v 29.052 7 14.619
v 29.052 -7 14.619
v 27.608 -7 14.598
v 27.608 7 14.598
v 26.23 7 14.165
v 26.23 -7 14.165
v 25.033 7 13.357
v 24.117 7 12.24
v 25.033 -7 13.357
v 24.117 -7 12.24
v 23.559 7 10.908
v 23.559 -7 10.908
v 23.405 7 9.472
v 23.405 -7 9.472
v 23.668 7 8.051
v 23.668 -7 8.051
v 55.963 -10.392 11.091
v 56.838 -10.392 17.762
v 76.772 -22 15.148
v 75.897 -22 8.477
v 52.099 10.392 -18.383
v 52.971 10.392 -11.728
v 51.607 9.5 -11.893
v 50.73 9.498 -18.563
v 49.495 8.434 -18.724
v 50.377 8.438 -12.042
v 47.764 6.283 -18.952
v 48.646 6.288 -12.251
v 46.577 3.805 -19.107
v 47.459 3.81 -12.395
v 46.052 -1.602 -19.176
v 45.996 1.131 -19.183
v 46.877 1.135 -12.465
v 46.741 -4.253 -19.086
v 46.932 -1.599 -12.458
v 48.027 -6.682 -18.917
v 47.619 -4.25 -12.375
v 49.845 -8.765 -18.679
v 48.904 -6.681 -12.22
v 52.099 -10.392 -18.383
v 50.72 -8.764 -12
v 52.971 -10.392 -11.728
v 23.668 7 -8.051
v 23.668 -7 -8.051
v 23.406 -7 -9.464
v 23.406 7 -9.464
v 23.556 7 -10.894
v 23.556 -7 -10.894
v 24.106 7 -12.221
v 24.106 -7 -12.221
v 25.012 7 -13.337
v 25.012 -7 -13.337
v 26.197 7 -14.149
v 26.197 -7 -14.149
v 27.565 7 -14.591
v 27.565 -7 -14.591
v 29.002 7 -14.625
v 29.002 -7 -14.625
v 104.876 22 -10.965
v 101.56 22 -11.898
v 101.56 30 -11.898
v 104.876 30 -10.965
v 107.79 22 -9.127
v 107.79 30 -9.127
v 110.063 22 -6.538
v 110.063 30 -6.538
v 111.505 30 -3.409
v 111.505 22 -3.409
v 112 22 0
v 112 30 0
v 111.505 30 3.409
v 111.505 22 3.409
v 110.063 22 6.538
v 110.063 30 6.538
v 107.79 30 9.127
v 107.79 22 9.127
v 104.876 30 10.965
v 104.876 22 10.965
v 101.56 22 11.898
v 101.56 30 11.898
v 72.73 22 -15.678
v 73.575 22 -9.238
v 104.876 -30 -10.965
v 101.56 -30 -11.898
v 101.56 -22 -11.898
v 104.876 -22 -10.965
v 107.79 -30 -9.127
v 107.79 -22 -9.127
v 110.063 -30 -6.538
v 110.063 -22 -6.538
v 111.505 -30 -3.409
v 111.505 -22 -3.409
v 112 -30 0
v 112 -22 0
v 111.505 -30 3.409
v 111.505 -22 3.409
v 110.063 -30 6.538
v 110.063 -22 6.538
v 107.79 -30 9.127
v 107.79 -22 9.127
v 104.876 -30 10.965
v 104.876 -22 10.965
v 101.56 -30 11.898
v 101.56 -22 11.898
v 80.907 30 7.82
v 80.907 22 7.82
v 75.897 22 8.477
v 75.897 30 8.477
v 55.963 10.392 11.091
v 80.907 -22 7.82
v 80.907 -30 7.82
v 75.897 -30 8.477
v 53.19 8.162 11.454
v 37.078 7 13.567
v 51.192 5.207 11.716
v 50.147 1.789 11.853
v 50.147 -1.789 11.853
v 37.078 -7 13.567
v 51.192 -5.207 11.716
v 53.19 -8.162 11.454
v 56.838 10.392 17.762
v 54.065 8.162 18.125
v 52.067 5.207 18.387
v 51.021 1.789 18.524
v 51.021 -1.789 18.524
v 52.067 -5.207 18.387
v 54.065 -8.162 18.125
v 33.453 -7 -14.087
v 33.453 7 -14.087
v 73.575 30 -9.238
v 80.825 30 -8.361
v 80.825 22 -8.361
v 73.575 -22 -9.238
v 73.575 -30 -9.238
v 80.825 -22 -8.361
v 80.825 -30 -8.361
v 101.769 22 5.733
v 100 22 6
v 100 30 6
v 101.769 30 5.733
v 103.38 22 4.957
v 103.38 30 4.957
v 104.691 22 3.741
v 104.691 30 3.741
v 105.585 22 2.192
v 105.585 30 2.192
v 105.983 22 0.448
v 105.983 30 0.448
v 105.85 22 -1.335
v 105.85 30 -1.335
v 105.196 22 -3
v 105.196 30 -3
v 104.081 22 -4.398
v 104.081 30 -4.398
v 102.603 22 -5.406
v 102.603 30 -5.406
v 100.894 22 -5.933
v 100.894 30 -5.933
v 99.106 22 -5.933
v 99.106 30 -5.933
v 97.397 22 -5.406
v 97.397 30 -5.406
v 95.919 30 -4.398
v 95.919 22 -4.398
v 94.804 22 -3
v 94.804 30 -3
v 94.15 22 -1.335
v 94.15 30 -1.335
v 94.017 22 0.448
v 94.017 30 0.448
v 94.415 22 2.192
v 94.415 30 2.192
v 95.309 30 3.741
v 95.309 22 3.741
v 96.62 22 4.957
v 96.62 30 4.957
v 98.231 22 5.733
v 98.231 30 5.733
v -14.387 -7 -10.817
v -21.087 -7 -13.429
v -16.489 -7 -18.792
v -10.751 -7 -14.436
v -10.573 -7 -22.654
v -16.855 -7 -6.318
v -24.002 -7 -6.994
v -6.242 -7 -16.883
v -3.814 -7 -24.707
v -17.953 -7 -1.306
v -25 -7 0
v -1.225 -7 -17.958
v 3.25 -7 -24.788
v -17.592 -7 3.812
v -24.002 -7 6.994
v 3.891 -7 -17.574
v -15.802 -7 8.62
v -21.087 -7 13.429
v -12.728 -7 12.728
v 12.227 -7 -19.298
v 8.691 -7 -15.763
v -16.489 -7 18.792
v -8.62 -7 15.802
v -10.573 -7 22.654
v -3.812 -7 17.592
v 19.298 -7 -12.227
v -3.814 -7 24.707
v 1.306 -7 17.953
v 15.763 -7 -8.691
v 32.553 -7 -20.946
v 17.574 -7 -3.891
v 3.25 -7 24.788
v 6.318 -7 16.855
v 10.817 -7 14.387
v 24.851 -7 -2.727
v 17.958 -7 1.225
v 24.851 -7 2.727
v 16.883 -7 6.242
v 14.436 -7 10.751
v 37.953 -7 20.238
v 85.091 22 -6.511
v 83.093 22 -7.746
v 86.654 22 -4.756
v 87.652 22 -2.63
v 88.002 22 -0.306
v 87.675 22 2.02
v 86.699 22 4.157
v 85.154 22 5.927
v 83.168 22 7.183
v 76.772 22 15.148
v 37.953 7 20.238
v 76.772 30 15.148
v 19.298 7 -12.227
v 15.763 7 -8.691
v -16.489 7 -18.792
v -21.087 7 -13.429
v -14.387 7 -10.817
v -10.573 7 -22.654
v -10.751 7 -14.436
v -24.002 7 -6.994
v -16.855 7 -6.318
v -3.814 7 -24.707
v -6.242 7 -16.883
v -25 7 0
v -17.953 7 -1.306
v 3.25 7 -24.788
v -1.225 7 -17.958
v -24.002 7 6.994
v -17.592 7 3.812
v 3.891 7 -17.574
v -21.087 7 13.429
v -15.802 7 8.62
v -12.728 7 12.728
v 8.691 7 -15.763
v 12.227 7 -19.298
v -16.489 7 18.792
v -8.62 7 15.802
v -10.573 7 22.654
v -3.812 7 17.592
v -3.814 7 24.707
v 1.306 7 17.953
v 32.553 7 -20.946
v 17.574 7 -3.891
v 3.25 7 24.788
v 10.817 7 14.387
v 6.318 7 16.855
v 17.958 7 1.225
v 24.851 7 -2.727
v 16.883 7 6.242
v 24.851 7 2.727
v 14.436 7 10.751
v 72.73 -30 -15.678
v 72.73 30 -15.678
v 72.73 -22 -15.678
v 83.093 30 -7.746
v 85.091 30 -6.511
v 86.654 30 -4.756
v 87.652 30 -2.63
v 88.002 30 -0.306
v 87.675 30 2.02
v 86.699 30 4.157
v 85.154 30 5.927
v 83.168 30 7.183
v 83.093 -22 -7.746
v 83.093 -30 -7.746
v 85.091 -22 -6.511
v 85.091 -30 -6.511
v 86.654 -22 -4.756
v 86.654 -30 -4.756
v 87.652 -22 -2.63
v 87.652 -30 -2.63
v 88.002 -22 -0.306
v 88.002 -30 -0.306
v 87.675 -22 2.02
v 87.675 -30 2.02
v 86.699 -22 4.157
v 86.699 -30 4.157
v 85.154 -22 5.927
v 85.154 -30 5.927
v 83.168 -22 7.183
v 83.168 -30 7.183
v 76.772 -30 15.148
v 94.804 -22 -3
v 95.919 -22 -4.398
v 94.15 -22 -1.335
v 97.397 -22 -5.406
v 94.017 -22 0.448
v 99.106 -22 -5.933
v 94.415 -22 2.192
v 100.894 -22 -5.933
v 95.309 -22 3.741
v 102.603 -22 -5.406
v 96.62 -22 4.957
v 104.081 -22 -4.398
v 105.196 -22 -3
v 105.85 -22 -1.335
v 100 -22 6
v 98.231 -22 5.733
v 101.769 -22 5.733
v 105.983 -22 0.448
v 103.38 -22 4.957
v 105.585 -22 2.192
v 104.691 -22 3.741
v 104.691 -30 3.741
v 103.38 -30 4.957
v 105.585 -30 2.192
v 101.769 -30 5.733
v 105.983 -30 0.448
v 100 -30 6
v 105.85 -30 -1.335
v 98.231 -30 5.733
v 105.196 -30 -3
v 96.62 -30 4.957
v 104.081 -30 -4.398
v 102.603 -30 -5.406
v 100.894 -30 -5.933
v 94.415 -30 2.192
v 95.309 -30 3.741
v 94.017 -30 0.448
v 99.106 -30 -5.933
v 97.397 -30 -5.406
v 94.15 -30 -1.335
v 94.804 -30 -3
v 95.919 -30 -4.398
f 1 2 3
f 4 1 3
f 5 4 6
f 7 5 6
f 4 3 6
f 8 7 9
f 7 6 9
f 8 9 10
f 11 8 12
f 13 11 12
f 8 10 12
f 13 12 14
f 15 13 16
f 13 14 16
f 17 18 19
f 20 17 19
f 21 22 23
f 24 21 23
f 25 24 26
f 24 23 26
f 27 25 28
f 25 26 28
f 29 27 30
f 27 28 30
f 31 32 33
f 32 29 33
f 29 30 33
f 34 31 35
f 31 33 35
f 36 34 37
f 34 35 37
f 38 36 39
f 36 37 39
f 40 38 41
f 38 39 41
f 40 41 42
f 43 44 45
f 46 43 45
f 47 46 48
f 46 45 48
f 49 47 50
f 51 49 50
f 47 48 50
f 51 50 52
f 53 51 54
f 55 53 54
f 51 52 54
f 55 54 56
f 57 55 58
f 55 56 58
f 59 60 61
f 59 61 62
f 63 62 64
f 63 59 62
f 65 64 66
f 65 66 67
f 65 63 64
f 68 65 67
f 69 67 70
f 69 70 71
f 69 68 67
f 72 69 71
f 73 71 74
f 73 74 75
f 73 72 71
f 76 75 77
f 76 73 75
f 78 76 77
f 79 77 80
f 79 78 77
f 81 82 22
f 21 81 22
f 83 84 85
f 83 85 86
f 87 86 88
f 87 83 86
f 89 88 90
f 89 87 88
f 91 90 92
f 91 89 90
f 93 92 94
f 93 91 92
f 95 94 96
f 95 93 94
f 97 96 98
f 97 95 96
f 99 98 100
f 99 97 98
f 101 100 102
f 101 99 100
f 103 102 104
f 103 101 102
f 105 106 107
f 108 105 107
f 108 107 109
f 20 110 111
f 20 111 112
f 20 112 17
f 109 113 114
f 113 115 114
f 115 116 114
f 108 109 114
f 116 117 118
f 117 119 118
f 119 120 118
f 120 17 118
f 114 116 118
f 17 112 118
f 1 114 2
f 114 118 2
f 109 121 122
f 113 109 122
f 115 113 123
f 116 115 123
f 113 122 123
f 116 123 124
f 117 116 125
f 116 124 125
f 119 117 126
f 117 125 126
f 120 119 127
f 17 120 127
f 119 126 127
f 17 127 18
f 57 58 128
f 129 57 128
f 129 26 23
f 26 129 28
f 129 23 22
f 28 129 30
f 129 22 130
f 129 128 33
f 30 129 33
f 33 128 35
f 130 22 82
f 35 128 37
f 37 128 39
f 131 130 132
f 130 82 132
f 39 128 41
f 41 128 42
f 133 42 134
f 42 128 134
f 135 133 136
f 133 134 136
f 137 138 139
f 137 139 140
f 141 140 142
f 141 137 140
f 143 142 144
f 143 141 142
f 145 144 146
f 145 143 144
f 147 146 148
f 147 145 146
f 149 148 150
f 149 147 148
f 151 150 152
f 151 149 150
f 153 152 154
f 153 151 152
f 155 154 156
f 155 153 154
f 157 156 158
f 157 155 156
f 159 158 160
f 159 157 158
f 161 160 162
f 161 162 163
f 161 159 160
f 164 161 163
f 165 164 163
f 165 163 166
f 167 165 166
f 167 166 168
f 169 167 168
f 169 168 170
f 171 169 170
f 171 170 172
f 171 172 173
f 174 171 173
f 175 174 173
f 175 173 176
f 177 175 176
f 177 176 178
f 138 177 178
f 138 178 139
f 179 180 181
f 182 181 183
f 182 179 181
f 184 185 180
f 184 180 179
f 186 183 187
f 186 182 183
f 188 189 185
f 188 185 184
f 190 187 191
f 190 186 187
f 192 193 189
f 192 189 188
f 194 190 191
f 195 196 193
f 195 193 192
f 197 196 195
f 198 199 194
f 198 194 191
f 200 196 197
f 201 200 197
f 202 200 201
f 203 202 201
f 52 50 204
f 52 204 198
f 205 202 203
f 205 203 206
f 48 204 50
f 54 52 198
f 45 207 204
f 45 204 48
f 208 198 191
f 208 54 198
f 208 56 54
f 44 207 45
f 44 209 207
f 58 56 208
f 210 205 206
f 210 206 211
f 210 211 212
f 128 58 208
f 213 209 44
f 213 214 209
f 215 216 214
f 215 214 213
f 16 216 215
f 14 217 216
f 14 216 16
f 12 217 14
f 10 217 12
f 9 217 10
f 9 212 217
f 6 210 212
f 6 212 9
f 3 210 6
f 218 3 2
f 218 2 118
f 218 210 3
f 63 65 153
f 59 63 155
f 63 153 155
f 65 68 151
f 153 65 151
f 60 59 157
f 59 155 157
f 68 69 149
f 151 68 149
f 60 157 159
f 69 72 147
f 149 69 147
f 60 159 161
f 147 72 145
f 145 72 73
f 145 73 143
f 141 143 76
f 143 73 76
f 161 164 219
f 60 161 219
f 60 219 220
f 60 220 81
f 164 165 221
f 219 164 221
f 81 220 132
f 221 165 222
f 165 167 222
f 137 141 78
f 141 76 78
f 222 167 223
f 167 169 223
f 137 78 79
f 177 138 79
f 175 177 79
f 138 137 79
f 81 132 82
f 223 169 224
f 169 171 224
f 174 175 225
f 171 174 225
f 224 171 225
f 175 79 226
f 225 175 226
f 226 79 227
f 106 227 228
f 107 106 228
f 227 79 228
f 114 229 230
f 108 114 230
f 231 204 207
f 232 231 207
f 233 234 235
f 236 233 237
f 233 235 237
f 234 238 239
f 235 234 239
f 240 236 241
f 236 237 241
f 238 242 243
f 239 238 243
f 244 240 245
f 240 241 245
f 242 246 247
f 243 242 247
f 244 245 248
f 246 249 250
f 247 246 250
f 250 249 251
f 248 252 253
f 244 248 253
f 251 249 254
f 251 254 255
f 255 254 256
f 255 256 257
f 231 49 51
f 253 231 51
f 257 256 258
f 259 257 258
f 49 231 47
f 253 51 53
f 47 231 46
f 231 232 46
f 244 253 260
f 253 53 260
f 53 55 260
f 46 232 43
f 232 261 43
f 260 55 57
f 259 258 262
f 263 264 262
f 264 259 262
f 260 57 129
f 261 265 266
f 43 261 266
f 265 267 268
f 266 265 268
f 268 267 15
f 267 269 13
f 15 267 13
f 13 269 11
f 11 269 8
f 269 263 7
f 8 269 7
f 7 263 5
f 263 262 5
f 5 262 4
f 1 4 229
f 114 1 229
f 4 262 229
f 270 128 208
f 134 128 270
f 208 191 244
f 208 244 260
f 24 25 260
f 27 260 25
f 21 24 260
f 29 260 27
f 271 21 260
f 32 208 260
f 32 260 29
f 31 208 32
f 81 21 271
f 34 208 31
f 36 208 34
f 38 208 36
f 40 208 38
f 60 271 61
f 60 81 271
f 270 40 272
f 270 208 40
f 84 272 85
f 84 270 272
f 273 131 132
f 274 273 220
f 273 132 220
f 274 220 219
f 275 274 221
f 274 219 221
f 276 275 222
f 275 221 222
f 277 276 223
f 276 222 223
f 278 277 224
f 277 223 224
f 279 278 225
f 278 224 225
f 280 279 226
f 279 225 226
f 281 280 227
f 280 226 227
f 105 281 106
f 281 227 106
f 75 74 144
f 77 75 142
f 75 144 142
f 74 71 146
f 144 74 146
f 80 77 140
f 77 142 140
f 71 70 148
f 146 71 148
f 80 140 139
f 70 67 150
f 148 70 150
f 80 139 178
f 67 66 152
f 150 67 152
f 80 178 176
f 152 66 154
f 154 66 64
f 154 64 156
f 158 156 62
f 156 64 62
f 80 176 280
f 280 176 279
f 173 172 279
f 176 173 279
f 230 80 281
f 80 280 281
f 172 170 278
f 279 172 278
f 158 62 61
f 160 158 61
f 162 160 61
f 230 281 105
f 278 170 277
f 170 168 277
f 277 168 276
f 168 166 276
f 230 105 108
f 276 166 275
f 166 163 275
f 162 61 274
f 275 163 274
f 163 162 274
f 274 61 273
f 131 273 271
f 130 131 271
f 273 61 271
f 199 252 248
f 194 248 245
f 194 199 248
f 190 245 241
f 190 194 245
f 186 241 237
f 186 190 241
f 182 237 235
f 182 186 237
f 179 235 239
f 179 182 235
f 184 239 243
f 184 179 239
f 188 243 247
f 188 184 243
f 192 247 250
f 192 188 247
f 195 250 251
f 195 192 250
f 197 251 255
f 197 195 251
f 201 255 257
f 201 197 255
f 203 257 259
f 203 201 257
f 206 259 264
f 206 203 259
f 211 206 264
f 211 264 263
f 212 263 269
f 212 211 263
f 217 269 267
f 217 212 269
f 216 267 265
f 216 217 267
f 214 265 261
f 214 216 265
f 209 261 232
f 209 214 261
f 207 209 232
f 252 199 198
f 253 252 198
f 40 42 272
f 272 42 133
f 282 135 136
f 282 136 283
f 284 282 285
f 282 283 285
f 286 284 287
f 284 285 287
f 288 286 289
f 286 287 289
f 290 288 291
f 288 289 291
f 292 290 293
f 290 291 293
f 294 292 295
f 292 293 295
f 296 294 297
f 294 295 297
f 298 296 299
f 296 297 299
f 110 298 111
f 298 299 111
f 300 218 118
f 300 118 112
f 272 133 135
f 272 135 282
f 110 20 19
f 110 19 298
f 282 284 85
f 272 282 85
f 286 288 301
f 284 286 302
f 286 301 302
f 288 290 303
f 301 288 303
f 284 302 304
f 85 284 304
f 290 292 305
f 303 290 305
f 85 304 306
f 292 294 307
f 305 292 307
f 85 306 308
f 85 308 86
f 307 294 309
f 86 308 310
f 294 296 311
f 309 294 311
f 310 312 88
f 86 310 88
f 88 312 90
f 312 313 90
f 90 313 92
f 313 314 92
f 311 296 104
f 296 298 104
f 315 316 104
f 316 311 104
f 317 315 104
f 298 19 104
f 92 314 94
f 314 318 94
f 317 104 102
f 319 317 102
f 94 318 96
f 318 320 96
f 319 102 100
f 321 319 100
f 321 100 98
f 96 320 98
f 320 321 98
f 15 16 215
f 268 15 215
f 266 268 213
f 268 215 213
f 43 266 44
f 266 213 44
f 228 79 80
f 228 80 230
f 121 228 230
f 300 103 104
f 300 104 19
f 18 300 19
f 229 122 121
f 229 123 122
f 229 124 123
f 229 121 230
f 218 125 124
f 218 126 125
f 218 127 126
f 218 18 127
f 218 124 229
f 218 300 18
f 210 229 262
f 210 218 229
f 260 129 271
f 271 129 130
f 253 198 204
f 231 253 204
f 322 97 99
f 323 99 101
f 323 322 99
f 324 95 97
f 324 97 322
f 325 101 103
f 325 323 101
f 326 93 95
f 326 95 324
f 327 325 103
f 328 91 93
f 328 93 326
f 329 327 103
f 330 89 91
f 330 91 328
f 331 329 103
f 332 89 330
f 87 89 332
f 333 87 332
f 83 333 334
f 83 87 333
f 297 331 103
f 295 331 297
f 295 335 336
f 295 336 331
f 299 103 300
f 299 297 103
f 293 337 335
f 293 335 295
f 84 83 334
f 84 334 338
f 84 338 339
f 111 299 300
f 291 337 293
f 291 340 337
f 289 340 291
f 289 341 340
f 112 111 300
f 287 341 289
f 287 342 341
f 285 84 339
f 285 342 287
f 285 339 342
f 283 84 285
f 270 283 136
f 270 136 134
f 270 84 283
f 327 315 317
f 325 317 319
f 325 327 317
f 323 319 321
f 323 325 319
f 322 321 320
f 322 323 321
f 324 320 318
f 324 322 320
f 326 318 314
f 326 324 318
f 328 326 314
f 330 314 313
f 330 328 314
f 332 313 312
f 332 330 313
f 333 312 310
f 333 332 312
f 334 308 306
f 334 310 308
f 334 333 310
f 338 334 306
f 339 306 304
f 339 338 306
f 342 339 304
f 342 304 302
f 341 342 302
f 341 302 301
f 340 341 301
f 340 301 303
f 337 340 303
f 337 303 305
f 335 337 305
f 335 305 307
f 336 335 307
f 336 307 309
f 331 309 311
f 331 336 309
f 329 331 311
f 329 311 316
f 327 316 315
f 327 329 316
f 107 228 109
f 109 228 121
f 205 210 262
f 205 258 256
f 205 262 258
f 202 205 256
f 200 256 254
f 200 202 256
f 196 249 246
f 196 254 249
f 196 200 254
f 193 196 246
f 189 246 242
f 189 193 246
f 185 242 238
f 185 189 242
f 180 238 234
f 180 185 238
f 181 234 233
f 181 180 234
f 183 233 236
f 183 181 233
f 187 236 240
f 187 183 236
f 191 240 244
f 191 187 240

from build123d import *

# Parameters (mm, degrees)
BOSS_EXTRUDE1_DEPTH      = 30
BOSS_EXTRUDE1_DEPTH_BACK = 30
SKETCH1_R                = 18
SKETCH1_R_2              = 6
CUT_EXTRUDE1_DEPTH       = 124.310147564
CUT_EXTRUDE2_DEPTH       = 124.310147564
CUT_EXTRUDE3_DEPTH       = 121.573628958


with BuildPart() as part:
    # Sketch1 → Boss-Extrude1 (new, two sides: drawn at the far end of the back side and taken through both)
    with BuildSketch(Plane(origin=(0, 0, 0), x_dir=(1, 0, 0), z_dir=(0, 1, 0)).offset(-BOSS_EXTRUDE1_DEPTH_BACK)):
        with BuildLine():
            Line((3.25, 24.787849846), (101.56, 11.898167926))
            ThreePointArc((101.56, 11.898167926), (112, 0), (101.56, -11.898167926))
            Line((101.56, -11.898167926), (3.25, -24.787849846))
            ThreePointArc((3.25, -24.787849846), (-25, 0), (3.25, 24.787849846))
        make_face()
        Circle(SKETCH1_R, mode=Mode.SUBTRACT)
        with Locations((100, 0)):
            Circle(SKETCH1_R_2, mode=Mode.SUBTRACT)
        with BuildLine():
            Line((29.001639294, 14.62548865), (80.82543669, 8.361367746))
            ThreePointArc((80.82543669, 8.361367746), (88.001643881, 0.306494185), (80.906985676, -7.820298705))
            Line((80.906985676, -7.820298705), (29.051639294, -14.619189161))
            ThreePointArc((29.051639294, -14.619189161), (24.534716663, -12.831305196), (23.668032745, -8.051349326))
            ThreePointArc((23.668032745, -8.051349326), (25, 0), (23.668032745, 8.051349326))
            ThreePointArc((23.668032745, 8.051349326), (24.518792048, 12.811777483), (29.001639294, 14.62548865))
        make_face(mode=Mode.SUBTRACT)
    extrude(amount=BOSS_EXTRUDE1_DEPTH + BOSS_EXTRUDE1_DEPTH_BACK)

    # Sketch2 → Cut-Extrude1 (cut, through all)
    with BuildSketch(Plane(origin=(3.25, 0, 24.787849846), x_dir=(0.9915139938498094, 0, -0.1300000000000003), z_dir=(0.1300000000000003, 0, 0.9915139938498095))):
        Polygon((-25, 30), (-25, 7), (35, 7), (74.151399385, 30), align=None)
    cut_extrude1 = extrude(amount=-CUT_EXTRUDE1_DEPTH, mode=Mode.SUBTRACT)

    # Mirror1: Cut-Extrude1 across plane
    add(cut_extrude1.mirror(Plane.ZX), mode=Mode.SUBTRACT)

    # Sketch3 → Cut-Extrude2 (cut, through all)
    with BuildSketch(Plane(origin=(3.25, 0, 24.787849846), x_dir=(0.9915139938498094, 0, -0.1300000000000003), z_dir=(0.1300000000000003, 0, 0.9915139938498095))):
        with BuildLine():
            Line((111.151399385, -22), (111.151399385, 22))
            Line((111.151399385, 22), (74.151399385, 22))
            Line((74.151399385, 22), (54.046281618, 10.392304845))
            ThreePointArc((54.046281618, 10.392304845), (48.046281618, 0), (54.046281618, -10.392304845))
            Line((54.046281618, -10.392304845), (74.151399385, -22))
            Line((74.151399385, -22), (111.151399385, -22))
        make_face()
    extrude(amount=-CUT_EXTRUDE2_DEPTH, mode=Mode.SUBTRACT)

    # Sketch4 → Cut-Extrude3 (cut, through all)
    with BuildSketch(Plane(origin=(0, 7, 0), x_dir=(1, 0, 0), z_dir=(0, 1, 0))):
        with BuildLine():
            Line((8.691485355, 15.762553167), (12.227019261, 19.298087073))
            Line((12.227019261, 19.298087073), (19.298087073, 12.227019261))
            Line((19.298087073, 12.227019261), (15.762553167, 8.691485355))
            ThreePointArc((15.762553167, 8.691485355), (12.727922061, 12.727922061), (8.691485355, 15.762553167))
        make_face()
    extrude(amount=-CUT_EXTRUDE3_DEPTH, mode=Mode.SUBTRACT)


solid = part.part
